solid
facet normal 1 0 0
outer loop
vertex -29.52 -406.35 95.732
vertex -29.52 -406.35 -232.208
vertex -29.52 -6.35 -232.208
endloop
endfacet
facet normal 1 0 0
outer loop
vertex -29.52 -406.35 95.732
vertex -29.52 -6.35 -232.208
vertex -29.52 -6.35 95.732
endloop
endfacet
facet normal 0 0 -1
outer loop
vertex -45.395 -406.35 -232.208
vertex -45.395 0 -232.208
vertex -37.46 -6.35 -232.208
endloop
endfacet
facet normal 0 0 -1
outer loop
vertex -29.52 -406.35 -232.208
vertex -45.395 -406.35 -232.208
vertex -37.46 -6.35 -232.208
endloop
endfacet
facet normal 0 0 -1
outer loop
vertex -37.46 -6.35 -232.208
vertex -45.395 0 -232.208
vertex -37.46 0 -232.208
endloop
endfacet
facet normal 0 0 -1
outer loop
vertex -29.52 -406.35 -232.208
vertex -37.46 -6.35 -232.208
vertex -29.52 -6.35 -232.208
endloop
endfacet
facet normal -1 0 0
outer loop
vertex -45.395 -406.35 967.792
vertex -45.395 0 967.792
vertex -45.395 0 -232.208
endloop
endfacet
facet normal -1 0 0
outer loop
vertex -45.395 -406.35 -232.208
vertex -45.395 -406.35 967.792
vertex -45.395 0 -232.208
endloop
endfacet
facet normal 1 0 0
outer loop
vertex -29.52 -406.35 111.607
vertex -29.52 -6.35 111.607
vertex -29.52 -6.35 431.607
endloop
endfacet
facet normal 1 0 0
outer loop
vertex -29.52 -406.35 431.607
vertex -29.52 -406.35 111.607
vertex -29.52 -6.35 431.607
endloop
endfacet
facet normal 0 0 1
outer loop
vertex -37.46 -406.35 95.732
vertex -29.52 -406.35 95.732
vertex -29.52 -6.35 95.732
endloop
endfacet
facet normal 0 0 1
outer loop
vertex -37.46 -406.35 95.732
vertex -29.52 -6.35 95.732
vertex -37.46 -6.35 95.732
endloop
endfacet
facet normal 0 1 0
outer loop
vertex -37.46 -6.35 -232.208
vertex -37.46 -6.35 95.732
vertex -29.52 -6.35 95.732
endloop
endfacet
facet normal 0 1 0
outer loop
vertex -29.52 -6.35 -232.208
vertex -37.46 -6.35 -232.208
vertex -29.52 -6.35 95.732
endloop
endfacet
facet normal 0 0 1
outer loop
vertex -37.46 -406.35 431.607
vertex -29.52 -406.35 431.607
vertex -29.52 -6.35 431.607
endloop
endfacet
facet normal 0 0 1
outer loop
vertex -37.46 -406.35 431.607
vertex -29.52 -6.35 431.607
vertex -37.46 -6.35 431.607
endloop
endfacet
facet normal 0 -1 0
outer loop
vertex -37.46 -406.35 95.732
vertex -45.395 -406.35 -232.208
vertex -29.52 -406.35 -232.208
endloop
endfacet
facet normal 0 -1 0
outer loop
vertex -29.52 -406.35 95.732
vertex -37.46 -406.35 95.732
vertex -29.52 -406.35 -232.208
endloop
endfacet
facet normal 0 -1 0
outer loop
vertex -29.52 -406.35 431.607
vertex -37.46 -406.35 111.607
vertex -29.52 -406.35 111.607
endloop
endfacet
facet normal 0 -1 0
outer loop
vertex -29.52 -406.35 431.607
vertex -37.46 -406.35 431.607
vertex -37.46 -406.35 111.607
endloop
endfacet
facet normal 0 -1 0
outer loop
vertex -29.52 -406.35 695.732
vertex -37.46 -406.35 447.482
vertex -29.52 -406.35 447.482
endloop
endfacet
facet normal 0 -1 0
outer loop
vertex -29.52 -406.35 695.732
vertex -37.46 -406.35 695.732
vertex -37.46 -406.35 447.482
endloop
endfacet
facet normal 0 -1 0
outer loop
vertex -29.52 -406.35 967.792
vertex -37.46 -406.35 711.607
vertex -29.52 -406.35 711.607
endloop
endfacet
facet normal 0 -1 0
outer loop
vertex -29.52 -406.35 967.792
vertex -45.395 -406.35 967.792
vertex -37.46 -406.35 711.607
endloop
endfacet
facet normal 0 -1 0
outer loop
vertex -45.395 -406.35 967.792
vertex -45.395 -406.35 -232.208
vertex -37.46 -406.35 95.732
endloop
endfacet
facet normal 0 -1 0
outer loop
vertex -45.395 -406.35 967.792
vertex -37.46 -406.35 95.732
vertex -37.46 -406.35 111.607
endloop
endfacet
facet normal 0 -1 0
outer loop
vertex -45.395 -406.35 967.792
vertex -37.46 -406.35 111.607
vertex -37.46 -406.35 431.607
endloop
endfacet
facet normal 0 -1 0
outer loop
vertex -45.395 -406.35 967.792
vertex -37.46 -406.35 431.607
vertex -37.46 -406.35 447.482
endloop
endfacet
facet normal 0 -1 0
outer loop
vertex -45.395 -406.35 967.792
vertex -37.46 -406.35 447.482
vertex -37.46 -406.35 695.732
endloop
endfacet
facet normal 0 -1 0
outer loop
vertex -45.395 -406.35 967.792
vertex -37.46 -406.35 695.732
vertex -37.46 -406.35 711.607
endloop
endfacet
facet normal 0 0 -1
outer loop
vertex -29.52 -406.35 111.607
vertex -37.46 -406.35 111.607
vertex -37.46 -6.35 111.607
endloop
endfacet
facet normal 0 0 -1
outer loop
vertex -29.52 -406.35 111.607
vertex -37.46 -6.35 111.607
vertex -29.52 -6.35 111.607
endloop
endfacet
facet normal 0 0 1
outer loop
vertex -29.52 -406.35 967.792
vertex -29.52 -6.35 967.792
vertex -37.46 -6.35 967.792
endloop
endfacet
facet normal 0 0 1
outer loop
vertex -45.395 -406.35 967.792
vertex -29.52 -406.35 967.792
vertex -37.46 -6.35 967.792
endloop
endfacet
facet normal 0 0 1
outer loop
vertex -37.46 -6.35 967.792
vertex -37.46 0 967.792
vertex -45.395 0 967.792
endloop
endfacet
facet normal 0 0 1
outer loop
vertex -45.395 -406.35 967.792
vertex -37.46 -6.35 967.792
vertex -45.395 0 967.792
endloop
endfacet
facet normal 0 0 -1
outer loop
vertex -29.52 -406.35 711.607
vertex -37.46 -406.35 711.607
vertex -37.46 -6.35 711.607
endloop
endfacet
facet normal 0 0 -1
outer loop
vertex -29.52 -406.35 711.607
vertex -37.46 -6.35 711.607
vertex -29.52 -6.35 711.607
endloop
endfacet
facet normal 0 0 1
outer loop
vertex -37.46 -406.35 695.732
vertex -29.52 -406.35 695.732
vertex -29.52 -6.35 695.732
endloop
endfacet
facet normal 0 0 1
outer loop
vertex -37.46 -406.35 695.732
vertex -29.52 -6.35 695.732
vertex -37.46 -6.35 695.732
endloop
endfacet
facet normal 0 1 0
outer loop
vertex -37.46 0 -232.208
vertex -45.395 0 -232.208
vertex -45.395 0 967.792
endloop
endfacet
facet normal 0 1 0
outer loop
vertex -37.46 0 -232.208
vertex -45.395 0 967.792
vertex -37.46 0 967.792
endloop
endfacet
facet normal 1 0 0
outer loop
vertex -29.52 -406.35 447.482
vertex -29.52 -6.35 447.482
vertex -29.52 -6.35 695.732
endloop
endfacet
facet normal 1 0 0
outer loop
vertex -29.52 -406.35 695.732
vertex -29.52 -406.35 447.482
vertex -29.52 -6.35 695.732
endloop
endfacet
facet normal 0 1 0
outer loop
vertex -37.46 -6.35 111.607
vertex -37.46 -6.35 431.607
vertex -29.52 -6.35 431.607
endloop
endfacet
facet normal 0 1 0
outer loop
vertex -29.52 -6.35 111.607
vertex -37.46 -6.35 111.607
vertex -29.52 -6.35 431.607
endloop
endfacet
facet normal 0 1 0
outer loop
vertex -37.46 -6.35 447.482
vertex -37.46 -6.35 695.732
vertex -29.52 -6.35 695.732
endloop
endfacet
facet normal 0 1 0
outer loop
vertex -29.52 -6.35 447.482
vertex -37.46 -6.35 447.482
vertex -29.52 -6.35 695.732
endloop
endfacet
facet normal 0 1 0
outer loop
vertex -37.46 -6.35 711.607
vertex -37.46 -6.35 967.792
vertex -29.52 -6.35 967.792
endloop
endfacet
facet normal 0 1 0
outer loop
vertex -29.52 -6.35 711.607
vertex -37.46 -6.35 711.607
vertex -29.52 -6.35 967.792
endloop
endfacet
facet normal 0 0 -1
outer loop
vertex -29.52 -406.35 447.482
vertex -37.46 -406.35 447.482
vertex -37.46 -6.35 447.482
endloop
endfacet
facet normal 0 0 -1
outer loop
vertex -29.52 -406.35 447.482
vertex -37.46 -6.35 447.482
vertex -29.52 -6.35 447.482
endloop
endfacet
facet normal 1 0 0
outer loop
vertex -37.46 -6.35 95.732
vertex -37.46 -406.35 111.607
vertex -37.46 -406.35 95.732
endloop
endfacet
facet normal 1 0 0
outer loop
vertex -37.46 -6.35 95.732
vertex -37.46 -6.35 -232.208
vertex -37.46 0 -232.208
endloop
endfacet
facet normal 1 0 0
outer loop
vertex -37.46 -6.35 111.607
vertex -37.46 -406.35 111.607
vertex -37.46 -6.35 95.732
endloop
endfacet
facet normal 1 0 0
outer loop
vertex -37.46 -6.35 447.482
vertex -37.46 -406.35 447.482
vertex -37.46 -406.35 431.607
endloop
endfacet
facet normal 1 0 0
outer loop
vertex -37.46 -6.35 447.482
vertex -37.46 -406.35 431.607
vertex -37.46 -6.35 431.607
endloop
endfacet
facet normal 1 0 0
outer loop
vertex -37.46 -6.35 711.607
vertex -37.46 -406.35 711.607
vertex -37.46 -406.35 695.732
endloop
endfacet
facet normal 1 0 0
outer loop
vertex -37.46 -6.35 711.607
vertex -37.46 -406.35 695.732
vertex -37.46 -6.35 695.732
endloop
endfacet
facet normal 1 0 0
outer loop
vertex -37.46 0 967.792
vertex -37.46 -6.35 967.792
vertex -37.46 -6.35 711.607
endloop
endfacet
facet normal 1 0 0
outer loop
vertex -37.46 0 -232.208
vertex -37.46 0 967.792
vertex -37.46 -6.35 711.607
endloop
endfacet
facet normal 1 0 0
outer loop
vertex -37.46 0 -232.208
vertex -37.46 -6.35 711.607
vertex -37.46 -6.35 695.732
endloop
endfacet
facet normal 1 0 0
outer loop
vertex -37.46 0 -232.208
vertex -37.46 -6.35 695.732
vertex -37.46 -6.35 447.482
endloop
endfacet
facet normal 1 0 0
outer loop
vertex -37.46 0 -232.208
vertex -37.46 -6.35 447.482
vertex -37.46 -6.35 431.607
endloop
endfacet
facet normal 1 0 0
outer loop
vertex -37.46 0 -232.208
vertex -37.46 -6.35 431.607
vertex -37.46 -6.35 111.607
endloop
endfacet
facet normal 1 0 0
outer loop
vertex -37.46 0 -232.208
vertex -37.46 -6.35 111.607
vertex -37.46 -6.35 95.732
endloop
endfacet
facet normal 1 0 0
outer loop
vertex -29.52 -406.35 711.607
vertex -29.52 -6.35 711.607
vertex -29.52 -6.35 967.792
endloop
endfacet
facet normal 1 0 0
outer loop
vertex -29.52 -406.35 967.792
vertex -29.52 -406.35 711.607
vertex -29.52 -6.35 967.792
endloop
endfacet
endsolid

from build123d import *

# Parameters (mm, degrees)
F1_DEPTH = 406.35
F2_W     = 7.94
F2_H     = 6.35
F3_DEPTH = 1200.001


with BuildPart() as f1:
    # F0 (on Front) → F1 (new body)
    with BuildSketch(Plane.XZ):
        Polygon((-29.519806, 967.791521), (-45.394806, 967.791521), (-45.394806, -232.208479), (-29.519806, -232.208479), (-29.519806, 95.731521), (-37.459806, 95.731521), (-37.459806, 111.606521), (-29.519806, 111.606521), (-29.519806, 431.606521), (-37.459806, 431.606521), (-37.459806, 447.481521), (-29.519806, 447.481521), (-29.519806, 695.731521), (-37.459806, 695.731521), (-37.459806, 711.606521), (-29.519806, 711.606521), align=None)
    extrude(amount=F1_DEPTH)

    # F2 (on face) → F3 (cut, through all)
    with BuildSketch(Plane.XY.offset(967.791521)):
        with Locations((-33.489806, -3.175)):
            Rectangle(F2_W, F2_H)
    extrude(amount=-F3_DEPTH, mode=Mode.SUBTRACT)


solid = f1.part
